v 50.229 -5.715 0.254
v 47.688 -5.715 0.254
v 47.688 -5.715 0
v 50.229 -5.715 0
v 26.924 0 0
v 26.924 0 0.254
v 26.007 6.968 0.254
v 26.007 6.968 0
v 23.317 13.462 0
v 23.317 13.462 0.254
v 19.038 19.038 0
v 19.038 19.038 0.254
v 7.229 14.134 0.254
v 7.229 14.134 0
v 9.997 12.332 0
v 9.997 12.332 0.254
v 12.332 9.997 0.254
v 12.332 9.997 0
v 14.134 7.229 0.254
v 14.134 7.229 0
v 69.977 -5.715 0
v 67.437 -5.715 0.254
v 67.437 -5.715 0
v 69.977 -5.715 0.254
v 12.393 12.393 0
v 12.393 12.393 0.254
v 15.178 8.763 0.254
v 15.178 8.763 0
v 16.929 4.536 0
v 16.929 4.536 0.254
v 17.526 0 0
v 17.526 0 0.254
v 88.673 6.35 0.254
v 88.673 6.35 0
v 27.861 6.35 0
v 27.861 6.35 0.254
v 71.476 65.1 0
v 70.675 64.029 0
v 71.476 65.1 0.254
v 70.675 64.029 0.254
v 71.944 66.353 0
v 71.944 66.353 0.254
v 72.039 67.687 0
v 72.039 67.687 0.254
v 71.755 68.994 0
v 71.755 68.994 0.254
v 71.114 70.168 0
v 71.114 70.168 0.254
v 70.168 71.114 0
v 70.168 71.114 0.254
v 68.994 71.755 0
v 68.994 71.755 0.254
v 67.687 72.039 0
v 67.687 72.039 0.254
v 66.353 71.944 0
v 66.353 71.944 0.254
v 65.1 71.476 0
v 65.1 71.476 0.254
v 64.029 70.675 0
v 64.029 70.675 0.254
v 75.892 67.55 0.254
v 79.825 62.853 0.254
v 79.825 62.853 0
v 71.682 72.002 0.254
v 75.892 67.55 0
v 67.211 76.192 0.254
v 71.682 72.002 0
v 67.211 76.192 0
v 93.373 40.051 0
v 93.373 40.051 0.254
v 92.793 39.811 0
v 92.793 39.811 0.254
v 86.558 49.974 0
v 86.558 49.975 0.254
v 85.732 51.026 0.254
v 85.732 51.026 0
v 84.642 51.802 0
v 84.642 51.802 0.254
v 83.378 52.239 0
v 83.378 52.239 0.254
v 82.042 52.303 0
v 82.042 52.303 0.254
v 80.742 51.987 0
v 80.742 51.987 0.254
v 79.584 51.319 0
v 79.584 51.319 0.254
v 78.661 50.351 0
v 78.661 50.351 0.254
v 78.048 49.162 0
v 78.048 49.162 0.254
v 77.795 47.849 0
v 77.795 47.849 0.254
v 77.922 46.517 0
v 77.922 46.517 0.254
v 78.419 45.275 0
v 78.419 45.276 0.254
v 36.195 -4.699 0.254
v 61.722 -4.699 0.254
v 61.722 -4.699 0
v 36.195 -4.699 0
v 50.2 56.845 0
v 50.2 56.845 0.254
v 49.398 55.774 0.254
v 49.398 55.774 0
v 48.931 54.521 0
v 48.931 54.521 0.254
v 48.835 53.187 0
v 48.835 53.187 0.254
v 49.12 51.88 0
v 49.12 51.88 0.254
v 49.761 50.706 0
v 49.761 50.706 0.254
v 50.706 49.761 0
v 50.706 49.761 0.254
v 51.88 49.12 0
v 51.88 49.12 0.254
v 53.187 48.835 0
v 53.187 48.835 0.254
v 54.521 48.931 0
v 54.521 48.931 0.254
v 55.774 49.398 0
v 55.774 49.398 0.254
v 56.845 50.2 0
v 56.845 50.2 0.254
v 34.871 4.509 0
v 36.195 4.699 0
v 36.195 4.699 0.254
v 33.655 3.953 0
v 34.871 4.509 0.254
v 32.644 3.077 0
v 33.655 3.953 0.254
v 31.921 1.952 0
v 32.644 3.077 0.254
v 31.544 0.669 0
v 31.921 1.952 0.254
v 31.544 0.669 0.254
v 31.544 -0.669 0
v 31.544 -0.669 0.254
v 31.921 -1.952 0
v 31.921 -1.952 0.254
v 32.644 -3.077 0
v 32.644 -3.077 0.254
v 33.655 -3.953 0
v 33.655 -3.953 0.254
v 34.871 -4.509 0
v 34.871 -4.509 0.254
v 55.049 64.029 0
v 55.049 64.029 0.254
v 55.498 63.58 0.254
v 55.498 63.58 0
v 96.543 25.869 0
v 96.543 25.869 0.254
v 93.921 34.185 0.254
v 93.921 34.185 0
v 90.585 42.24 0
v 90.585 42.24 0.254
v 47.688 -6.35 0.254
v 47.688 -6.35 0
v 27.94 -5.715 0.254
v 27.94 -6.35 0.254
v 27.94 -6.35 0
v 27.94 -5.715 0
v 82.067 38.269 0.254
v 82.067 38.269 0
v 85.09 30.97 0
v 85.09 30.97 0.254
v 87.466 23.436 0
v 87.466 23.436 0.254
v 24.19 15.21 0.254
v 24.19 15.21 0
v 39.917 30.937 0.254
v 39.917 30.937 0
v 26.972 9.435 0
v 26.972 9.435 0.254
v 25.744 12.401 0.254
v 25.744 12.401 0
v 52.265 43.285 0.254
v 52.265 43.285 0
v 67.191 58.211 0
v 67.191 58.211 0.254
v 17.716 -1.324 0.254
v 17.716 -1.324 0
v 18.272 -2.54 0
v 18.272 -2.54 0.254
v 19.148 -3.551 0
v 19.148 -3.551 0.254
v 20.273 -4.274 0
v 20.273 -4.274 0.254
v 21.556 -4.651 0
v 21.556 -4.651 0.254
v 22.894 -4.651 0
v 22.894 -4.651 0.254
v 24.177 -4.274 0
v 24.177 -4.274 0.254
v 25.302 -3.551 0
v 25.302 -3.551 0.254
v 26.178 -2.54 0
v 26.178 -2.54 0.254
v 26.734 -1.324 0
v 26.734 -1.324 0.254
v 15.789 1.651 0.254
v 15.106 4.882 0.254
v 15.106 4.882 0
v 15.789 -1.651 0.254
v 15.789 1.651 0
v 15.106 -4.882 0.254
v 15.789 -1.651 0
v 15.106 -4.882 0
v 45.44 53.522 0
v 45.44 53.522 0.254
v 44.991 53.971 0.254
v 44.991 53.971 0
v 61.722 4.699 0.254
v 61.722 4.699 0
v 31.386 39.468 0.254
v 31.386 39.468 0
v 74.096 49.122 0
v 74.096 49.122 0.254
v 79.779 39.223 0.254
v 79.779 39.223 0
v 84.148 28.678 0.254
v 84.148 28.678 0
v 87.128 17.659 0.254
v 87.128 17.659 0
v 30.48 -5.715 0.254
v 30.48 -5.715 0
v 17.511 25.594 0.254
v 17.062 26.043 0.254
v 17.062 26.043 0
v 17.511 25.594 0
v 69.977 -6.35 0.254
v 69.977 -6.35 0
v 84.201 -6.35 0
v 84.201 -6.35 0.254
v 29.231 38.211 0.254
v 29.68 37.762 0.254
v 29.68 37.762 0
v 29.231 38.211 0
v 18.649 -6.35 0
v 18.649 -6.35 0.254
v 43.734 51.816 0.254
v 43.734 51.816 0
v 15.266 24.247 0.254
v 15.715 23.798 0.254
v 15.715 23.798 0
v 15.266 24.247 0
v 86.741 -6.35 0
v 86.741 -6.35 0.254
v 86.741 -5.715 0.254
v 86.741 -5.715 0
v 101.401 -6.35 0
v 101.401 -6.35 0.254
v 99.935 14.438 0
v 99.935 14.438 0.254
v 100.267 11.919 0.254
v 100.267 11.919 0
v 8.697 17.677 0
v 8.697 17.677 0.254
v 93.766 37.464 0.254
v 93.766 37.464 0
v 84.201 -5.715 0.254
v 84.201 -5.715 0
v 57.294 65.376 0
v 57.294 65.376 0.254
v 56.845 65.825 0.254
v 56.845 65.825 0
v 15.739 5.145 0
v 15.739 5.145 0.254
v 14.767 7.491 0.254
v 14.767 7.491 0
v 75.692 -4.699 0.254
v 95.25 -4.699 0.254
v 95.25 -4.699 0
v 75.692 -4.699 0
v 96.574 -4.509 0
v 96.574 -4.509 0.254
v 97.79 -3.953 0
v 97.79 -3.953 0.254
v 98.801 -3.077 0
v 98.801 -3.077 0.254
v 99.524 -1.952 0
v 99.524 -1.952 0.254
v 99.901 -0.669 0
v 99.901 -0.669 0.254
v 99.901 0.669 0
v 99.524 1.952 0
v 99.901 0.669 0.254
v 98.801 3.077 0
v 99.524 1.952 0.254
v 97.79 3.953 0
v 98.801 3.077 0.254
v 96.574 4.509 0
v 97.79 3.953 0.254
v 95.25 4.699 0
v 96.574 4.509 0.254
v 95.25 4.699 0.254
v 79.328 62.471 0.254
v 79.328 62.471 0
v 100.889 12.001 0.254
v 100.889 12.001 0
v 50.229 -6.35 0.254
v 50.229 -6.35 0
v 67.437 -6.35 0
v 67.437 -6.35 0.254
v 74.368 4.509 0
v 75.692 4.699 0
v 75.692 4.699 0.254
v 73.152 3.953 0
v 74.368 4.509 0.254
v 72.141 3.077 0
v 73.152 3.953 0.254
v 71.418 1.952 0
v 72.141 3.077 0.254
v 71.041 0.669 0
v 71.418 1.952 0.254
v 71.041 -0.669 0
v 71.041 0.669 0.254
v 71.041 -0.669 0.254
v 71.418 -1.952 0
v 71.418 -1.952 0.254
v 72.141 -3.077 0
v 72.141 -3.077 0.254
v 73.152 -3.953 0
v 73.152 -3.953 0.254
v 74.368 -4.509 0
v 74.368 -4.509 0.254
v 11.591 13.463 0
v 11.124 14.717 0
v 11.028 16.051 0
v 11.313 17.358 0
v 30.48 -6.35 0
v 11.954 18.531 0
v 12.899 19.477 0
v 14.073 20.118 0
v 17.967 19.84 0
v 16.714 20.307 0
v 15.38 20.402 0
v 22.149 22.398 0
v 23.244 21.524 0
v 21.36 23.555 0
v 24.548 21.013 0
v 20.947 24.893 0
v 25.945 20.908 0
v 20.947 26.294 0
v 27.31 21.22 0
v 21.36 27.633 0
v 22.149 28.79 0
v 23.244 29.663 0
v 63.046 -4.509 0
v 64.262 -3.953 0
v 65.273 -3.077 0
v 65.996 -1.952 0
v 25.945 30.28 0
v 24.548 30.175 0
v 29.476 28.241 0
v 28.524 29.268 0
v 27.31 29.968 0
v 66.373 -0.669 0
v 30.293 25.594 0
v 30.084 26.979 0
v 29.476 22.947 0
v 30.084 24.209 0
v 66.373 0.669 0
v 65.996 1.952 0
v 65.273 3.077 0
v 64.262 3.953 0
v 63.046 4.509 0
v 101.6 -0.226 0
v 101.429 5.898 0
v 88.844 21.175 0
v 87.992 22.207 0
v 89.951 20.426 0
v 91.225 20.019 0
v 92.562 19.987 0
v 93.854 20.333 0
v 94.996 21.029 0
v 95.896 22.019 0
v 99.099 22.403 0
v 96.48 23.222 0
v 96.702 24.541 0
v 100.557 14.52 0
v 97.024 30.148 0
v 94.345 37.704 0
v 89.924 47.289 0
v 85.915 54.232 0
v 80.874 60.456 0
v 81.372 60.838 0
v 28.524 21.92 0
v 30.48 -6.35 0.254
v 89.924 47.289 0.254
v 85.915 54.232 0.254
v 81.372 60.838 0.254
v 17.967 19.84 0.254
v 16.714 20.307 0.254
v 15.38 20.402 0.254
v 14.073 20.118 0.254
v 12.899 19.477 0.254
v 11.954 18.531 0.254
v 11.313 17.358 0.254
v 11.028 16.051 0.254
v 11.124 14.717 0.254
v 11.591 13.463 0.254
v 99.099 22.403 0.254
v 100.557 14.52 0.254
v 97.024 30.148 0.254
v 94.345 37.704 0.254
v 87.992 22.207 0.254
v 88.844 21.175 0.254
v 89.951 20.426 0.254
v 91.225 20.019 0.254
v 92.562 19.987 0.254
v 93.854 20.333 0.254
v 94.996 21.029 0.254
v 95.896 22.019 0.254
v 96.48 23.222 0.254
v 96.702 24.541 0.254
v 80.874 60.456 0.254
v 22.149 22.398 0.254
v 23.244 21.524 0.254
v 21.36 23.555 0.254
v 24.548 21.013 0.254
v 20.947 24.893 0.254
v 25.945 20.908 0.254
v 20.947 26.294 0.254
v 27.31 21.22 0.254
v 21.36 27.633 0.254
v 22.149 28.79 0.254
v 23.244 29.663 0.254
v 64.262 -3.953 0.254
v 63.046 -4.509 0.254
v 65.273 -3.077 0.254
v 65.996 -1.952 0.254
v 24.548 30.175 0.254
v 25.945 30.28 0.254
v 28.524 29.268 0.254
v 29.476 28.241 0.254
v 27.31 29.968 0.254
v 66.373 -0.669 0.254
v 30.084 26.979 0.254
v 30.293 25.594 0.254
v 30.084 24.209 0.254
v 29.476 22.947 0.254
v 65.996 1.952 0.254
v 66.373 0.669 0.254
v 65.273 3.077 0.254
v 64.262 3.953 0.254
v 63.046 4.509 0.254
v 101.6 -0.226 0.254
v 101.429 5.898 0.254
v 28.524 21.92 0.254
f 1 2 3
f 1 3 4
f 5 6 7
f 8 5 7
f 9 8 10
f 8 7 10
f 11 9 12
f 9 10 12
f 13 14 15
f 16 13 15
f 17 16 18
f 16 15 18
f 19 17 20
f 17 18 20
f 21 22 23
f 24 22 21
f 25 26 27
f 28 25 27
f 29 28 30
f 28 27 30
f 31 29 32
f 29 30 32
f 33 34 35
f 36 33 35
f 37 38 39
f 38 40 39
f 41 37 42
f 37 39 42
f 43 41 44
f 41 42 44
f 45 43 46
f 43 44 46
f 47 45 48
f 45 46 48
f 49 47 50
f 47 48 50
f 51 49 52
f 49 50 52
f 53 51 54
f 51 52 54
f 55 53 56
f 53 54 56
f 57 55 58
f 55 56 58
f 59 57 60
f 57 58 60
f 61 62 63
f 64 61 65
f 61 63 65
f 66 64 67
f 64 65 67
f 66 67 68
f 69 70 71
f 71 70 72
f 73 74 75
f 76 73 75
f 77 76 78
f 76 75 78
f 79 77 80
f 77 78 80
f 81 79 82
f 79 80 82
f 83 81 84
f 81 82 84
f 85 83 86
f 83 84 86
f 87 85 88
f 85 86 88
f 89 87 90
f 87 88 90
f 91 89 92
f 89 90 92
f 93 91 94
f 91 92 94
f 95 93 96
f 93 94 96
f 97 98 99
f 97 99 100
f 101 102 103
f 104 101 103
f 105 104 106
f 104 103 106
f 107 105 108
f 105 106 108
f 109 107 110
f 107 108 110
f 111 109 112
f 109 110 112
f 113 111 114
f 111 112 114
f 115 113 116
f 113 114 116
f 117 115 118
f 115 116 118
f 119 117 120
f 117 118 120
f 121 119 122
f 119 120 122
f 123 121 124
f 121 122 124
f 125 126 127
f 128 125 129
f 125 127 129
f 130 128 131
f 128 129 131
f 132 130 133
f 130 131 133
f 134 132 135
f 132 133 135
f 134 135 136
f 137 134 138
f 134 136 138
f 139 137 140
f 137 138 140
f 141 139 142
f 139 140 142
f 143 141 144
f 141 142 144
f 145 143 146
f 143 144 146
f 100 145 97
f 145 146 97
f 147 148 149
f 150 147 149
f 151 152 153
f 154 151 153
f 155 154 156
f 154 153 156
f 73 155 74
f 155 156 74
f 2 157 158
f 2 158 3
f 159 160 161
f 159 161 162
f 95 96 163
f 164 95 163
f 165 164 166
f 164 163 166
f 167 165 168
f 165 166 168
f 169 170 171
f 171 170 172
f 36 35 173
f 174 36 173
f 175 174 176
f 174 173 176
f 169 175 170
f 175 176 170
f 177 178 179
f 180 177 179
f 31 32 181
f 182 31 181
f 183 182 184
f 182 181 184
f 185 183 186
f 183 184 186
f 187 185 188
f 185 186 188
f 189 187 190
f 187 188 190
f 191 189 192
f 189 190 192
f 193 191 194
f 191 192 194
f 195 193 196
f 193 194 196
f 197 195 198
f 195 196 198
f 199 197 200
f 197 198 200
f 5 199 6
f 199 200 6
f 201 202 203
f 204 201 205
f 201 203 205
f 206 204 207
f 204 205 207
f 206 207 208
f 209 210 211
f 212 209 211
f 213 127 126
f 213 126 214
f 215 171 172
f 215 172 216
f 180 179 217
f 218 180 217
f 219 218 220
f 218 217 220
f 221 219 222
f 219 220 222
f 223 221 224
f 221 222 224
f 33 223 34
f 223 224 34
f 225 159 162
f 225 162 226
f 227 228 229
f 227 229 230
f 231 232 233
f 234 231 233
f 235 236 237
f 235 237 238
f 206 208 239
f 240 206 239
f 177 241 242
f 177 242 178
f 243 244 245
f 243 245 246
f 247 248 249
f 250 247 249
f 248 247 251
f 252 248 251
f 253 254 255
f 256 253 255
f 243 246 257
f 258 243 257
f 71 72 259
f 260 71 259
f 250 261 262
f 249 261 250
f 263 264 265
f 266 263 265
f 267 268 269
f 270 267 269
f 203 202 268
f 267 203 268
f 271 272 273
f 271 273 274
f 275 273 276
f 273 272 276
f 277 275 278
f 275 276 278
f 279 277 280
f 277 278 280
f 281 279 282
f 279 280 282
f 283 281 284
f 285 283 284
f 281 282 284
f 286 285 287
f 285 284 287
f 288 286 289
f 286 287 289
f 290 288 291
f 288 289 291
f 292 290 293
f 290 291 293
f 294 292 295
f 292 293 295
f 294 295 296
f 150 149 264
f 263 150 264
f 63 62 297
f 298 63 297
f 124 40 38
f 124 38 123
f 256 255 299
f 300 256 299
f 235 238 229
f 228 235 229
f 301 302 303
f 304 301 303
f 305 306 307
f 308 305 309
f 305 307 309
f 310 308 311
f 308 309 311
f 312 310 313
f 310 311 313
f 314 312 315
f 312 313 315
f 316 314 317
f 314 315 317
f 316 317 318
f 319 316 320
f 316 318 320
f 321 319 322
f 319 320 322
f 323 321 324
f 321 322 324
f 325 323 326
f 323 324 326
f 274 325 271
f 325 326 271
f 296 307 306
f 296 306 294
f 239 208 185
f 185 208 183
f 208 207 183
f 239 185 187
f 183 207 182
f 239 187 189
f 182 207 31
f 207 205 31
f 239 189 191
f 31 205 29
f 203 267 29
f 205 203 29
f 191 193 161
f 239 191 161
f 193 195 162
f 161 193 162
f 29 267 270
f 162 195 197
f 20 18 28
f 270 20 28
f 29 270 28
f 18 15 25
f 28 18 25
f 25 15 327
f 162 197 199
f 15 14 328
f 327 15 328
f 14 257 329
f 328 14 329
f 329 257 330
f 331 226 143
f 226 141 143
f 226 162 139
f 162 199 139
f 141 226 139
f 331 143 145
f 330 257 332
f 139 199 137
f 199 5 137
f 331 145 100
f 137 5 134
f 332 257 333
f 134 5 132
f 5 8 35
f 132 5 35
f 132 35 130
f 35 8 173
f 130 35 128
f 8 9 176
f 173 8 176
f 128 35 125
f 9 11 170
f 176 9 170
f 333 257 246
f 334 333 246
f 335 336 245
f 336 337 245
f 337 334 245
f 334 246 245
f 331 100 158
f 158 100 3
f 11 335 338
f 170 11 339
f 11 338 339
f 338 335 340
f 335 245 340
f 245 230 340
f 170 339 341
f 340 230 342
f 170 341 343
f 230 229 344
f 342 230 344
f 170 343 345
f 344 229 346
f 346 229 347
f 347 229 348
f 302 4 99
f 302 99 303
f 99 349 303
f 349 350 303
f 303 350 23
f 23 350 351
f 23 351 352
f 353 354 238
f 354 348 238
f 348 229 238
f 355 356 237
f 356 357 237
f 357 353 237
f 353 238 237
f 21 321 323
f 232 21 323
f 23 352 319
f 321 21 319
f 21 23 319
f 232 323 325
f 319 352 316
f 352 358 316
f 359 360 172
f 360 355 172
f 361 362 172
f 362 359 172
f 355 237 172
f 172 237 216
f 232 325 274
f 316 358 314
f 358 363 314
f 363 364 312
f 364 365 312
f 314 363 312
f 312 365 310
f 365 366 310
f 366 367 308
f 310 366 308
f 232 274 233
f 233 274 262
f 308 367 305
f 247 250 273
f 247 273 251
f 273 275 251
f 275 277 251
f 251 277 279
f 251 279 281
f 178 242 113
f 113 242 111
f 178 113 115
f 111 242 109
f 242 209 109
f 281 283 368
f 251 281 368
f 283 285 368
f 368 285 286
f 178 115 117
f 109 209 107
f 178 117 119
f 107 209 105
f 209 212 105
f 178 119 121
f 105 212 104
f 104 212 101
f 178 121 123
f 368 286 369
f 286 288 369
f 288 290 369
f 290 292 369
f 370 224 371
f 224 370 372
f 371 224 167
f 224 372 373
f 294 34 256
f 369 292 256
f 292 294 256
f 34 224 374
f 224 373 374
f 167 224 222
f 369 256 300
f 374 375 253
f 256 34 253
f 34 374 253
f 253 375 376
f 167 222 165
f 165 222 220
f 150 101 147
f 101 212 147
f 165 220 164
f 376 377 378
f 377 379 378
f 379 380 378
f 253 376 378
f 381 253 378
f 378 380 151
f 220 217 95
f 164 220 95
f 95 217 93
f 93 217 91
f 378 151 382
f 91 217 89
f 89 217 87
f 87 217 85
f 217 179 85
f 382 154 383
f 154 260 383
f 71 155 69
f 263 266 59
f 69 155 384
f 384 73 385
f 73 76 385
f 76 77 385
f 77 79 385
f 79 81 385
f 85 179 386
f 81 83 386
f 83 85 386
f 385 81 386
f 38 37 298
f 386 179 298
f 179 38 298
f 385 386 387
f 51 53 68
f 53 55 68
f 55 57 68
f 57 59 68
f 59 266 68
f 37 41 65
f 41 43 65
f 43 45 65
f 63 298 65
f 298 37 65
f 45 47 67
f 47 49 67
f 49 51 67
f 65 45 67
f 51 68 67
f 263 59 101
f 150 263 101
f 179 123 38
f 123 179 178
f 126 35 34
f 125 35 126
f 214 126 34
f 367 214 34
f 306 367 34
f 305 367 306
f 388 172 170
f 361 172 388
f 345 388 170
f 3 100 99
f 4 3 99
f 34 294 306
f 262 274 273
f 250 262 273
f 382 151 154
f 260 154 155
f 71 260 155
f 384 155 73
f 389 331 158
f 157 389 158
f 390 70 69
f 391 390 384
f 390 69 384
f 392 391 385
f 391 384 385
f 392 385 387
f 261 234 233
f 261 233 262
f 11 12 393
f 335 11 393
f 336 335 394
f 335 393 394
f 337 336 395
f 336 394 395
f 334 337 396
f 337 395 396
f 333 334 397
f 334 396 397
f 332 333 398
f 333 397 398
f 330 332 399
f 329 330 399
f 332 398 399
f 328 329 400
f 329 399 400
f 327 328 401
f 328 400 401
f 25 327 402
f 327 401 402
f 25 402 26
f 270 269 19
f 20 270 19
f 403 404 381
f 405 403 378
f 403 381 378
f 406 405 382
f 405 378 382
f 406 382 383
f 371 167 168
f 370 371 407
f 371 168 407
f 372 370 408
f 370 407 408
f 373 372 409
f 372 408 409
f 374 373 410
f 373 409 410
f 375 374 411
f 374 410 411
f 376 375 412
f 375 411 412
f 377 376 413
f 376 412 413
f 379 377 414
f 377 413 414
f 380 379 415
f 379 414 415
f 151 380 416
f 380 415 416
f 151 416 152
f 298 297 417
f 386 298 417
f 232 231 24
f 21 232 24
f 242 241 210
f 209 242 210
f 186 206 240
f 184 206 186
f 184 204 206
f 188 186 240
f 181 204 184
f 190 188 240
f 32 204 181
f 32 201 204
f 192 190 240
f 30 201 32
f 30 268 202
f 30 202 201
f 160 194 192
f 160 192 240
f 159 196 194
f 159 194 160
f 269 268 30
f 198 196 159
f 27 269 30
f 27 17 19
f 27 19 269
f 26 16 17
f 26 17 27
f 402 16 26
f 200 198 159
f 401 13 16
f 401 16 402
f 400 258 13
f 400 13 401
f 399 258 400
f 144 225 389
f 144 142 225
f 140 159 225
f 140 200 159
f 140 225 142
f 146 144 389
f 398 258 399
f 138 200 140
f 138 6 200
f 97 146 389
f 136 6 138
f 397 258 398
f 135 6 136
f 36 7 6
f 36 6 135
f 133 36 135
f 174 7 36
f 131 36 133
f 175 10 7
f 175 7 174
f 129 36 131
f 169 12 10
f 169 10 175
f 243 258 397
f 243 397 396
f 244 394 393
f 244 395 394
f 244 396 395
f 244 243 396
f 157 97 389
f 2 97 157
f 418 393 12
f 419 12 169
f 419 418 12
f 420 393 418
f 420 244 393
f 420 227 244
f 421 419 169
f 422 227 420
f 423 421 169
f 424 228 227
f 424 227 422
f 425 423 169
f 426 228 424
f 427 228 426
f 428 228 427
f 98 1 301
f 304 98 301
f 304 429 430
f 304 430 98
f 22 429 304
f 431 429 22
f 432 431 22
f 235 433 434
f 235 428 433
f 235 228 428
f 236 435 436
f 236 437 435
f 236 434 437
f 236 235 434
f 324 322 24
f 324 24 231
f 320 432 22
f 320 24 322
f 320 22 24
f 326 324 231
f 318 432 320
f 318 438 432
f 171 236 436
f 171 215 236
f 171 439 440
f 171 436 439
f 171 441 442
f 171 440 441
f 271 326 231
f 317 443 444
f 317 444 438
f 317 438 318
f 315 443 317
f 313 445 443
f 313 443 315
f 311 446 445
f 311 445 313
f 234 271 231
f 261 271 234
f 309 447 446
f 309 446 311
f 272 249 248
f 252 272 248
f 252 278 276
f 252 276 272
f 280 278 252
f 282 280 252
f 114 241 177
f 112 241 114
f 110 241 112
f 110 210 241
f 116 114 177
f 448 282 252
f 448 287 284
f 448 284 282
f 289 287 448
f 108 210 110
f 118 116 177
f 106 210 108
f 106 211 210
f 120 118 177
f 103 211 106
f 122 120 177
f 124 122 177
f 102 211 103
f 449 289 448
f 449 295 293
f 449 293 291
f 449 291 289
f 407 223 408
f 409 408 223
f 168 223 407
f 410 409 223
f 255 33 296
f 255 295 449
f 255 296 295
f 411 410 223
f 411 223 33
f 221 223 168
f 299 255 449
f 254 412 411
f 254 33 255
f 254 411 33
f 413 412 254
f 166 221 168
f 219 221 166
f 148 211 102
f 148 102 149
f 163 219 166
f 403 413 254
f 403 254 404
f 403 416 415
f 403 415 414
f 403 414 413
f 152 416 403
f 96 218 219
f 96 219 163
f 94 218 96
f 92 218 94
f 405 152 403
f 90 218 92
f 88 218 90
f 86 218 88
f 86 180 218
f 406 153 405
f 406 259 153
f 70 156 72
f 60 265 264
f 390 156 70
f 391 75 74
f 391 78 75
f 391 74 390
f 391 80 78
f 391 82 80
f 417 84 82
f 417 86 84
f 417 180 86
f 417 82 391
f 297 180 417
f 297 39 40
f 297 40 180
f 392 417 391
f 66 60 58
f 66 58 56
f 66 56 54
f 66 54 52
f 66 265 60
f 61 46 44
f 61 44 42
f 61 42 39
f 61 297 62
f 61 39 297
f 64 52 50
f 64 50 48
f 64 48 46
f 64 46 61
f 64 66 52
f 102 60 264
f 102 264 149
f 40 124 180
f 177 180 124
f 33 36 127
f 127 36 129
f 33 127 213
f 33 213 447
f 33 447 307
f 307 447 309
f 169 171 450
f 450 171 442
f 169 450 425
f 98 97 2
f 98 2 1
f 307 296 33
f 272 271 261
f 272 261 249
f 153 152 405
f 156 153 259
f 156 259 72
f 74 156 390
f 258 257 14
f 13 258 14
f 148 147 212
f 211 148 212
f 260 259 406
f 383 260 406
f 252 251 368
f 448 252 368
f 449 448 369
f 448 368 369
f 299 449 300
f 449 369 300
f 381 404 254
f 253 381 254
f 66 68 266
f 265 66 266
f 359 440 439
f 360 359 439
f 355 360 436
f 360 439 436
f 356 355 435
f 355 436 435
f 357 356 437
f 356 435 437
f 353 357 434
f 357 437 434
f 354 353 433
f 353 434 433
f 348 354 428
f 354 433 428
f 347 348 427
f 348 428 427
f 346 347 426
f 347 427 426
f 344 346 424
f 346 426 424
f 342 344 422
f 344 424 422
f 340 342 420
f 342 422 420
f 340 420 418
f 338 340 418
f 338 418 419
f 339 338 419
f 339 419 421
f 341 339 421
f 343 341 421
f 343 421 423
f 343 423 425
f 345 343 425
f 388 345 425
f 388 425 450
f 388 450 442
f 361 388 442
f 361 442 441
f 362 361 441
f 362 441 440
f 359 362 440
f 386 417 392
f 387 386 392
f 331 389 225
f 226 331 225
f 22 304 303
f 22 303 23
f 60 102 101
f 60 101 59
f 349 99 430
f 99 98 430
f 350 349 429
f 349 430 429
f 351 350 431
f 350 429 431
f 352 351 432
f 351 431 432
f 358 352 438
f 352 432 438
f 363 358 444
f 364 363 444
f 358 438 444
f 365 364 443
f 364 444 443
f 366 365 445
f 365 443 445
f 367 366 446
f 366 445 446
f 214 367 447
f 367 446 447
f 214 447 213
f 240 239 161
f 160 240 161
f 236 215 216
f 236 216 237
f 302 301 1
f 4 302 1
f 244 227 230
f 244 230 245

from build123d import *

# Parameters (mm, degrees)
BOSS_EXTRUDE1_DEPTH = 0.254
SKETCH2_R           = 4.699
CUT_EXTRUDE1_DEPTH  = 1.254
SKETCH3_W           = 2.54
SKETCH3_H           = 0.635
CUT_EXTRUDE2_DEPTH  = 1.254
CUT_EXTRUDE4_DEPTH  = 1.254
CUT_EXTRUDE5_DEPTH  = 1.254


with BuildPart() as part:
    # Sketch1 → Boss-Extrude1 (new body)
    with BuildSketch(Plane.XY):
        with BuildLine():
            Line((67.21146711, 76.191723231), (8.696654013, 17.676910134))
            Line((8.696654013, 17.676910134), (7.228954972, 14.133571205))
            ThreePointArc((7.228954972, 14.133571205), (14.666587579, 6.075099489), (15.105587123, -4.88230096))
            Line((15.105587123, -4.88230096), (18.648926052, -6.35))
            Line((18.648926052, -6.35), (101.401368334, -6.35))
            ThreePointArc((101.401368334, -6.35), (93.866160503, 38.880636728), (67.21146711, 76.191723231))
        make_face()
        with BuildLine():
            Line((88.672924278, 6.35), (27.86051193, 6.35))
            ThreePointArc((27.86051193, 6.35), (26.399857642, 10.93517908), (24.190484974, 15.210228852))
            Line((24.190484974, 15.210228852), (67.191354125, 58.211098004))
            ThreePointArc((67.191354125, 58.211098004), (82.13289044, 34.020557137), (88.672924278, 6.35))
        make_face(mode=Mode.SUBTRACT)
    extrude(amount=BOSS_EXTRUDE1_DEPTH)

    # Sketch2 → Cut-Extrude1 (cut, through all)
    with BuildSketch(Plane.XY.offset(0.254)):
        with Locations((22.225, 0)):
            Circle(SKETCH2_R)
        with Locations((36.195, 0)):
            Circle(SKETCH2_R)
        with Locations((61.722, 0)):
            Circle(SKETCH2_R)
        with Locations((75.692, 0)):
            Circle(SKETCH2_R)
        with Locations((95.25, 0)):
            Circle(SKETCH2_R)
        with Locations((15.715448212, 15.715448212)):
            Circle(SKETCH2_R)
        with Locations((25.593729945, 25.593729945)):
            Circle(SKETCH2_R)
        with Locations((43.644044748, 43.644044748)):
            Circle(SKETCH2_R)
        with Locations((53.522326482, 53.522326482)):
            Circle(SKETCH2_R)
        with Locations((92.004434954, 24.652514046)):
            Circle(SKETCH2_R)
        with Locations((82.48891971, 47.625)):
            Circle(SKETCH2_R)
        with Locations((67.351920908, 67.351920908)):
            Circle(SKETCH2_R)
    extrude(amount=-CUT_EXTRUDE1_DEPTH, mode=Mode.SUBTRACT)

    # Sketch3 → Cut-Extrude2 (cut, through all)
    with BuildSketch(Plane.XY.offset(0.254)):
        Polygon((15.266435406, 24.246691527), (17.06248663, 26.042742751), (17.511499436, 25.593729945), (15.715448212, 23.797678721), align=None)
        Polygon((44.991083167, 53.971339288), (43.195031942, 52.175288063), (43.644044748, 51.726275257), (45.440095973, 53.522326482), align=None)
        with Locations((29.21, -6.0325)):
            Rectangle(SKETCH3_W, SKETCH3_H)
        with Locations((68.707, -6.0325)):
            Rectangle(SKETCH3_W, SKETCH3_H)
        Polygon((29.230733674, 38.210989795), (31.026784898, 40.007041019), (31.475797704, 39.558028213), (29.67974648, 37.761976989), align=None)
        Polygon((56.845021246, 65.825277367), (55.048970022, 64.029226143), (55.497982828, 63.580213337), (57.294034052, 65.376264561), align=None)
        with Locations((48.9585, -6.0325)):
            Rectangle(SKETCH3_W, SKETCH3_H)
        with Locations((85.471, -6.0325)):
            Rectangle(SKETCH3_W, SKETCH3_H)
        Polygon((99.935462164, 14.437711971), (100.266998693, 11.919442024), (101.526133667, 12.085210288), (101.194597138, 14.603480236), align=None)
        Polygon((93.765504959, 37.464305742), (94.938831965, 37.950313702), (93.966816047, 40.296967714), (92.793489041, 39.810959755), align=None)
        Polygon((79.327792988, 62.471156422), (80.874047017, 60.456038938), (81.88160576, 61.229165953), (80.33535173, 63.244283437), align=None)
        Polygon((13.593916116, 7.005422516), (14.565932035, 4.658768503), (15.739259041, 5.144776462), (14.767243123, 7.491430475), align=None)
    extrude(amount=-CUT_EXTRUDE2_DEPTH, mode=Mode.SUBTRACT)

    # Sketch6 → Cut-Extrude4 (cut, through all)
    with BuildSketch(Plane.XY.offset(0.254)):
        with BuildLine():
            Line((50.199631717, 56.845021246), (64.029226143, 70.674615673))
            ThreePointArc((64.029226143, 70.674615673), (70.674615673, 70.674615673), (70.674615673, 64.029226143))
            Line((70.674615673, 64.029226143), (56.845021246, 50.199631717))
            ThreePointArc((56.845021246, 50.199631717), (50.199631717, 50.199631717), (50.199631717, 56.845021246))
        make_face()
        with BuildLine():
            Line((61.722, -4.699), (36.195, -4.699))
            ThreePointArc((36.195, -4.699), (31.496, 0), (36.195, 4.699))
            Line((36.195, 4.699), (61.722, 4.699))
            ThreePointArc((61.722, 4.699), (66.421, 0), (61.722, -4.699))
        make_face()
        with BuildLine():
            Line((95.25, -4.699), (75.692, -4.699))
            ThreePointArc((75.692, -4.699), (70.993, 0), (75.692, 4.699))
            Line((75.692, 4.699), (95.25, 4.699))
            ThreePointArc((95.25, 4.699), (99.949, 0), (95.25, -4.699))
        make_face()
        with BuildLine():
            ThreePointArc((26.924, 0), (24.874532533, 10.303368733), (19.038142977, 19.038142977))
            ThreePointArc((19.038142977, 19.038142977), (12.392753447, 19.038142977), (12.392753447, 12.392753447))
            ThreePointArc((12.392753447, 12.392753447), (16.191912687, 6.706909836), (17.526, 0))
            ThreePointArc((17.526, 0), (22.225, -4.699), (26.924, 0))
        make_face()
        with BuildLine():
            ThreePointArc((96.543320412, 25.868704739), (92.340835395, 38.248826381), (86.558373083, 49.9745))
            ThreePointArc((86.558373083, 49.9745), (80.13941971, 51.694453372), (78.419466338, 45.2755))
            ThreePointArc((78.419466338, 45.2755), (83.658215548, 34.652367484), (87.465549496, 23.436323353))
            ThreePointArc((87.465549496, 23.436323353), (93.220625647, 20.113628588), (96.543320412, 25.868704739))
        make_face()
    extrude(amount=-CUT_EXTRUDE4_DEPTH, mode=Mode.SUBTRACT)

    # Sketch5 → Cut-Extrude5 (cut, through all)
    with BuildSketch(Plane.XY.offset(0.254)):
        Polygon((30.038956725, 40.81526407), (42.386808891, 53.163116237), (53.163116237, 42.386808891), (40.81526407, 30.038956725), align=None)
    extrude(amount=-CUT_EXTRUDE5_DEPTH, mode=Mode.SUBTRACT)


solid = part.part
